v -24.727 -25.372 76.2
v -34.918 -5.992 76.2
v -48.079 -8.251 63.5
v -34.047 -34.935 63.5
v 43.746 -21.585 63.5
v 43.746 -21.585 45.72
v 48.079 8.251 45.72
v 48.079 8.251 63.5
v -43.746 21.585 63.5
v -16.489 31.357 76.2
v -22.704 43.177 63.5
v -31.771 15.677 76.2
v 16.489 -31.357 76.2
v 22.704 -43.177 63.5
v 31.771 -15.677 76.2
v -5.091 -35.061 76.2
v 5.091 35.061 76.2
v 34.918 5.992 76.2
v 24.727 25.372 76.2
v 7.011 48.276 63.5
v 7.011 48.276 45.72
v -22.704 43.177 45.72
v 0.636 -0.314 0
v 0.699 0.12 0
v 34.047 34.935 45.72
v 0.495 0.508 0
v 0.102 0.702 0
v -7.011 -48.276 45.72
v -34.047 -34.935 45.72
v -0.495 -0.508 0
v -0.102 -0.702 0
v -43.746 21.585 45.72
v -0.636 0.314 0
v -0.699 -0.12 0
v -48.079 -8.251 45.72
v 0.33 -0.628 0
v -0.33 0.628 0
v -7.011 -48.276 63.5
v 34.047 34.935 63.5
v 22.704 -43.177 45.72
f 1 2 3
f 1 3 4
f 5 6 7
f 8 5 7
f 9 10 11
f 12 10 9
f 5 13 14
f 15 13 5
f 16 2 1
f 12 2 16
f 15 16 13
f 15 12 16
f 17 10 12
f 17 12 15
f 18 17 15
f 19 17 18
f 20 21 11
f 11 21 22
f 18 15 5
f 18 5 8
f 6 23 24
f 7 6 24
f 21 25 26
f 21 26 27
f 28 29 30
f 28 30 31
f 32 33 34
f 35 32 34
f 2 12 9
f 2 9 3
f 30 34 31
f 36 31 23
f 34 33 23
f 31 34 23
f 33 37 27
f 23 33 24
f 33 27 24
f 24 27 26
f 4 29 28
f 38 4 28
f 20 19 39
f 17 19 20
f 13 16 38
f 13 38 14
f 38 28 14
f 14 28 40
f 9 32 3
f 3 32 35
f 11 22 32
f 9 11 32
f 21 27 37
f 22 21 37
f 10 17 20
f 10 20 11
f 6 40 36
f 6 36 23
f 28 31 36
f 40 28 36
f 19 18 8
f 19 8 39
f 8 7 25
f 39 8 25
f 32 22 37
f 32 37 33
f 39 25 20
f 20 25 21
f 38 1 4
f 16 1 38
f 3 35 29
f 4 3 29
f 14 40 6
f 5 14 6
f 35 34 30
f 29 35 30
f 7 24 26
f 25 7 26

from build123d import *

# Parameters (mm, degrees)
F1_DEPTH = 76.2
F2_SIZE  = 12.7
F3_SIZE  = 45.72


with BuildPart() as f1:
    # F0 (on Top) → F1 (new body)
    with BuildSketch(Plane.XY):
        Polygon((-22.704043, 43.176515), (-43.746475, 21.585433), (-48.079241, -8.250551), (-34.047371, -34.935105), (-7.010562, -48.275636), (22.704043, -43.176515), (43.746475, -21.585433), (48.079241, 8.250551), (34.047371, 34.935105), (7.010562, 48.275636), align=None)
    extrude(amount=F1_DEPTH)

    # F2
    f2_edges = [f1.edges().sort_by_distance(p)[0] for p in [
        (7.84674, -45.726075, 76.2),
        (33.225259, -32.380974, 76.2),
        (45.912858, -6.667441, 76.2),
        (41.063306, 21.592828, 76.2),
        (20.528967, 41.60537, 76.2),
        (-7.84674, 45.726075, 76.2),
        (-20.528967, -41.60537, 76.2),
        (-41.063306, -21.592828, 76.2),
        (-45.912858, 6.667441, 76.2),
        (-33.225259, 32.380974, 76.2),
    ]]
    chamfer(f2_edges, length=F2_SIZE)

    # F3
    f3_edges = [f1.edges().sort_by_distance(p)[0] for p in [
        (-20.528967, -41.60537, 0),
        (7.84674, -45.726075, 0),
        (33.225259, -32.380974, 0),
        (45.912858, -6.667441, 0),
        (41.063306, 21.592828, 0),
        (20.528967, 41.60537, 0),
        (-7.84674, 45.726075, 0),
        (-33.225259, 32.380974, 0),
        (-45.912858, 6.667441, 0),
        (-41.063306, -21.592828, 0),
    ]]
    chamfer(f3_edges, length=F3_SIZE)


solid = f1.part
